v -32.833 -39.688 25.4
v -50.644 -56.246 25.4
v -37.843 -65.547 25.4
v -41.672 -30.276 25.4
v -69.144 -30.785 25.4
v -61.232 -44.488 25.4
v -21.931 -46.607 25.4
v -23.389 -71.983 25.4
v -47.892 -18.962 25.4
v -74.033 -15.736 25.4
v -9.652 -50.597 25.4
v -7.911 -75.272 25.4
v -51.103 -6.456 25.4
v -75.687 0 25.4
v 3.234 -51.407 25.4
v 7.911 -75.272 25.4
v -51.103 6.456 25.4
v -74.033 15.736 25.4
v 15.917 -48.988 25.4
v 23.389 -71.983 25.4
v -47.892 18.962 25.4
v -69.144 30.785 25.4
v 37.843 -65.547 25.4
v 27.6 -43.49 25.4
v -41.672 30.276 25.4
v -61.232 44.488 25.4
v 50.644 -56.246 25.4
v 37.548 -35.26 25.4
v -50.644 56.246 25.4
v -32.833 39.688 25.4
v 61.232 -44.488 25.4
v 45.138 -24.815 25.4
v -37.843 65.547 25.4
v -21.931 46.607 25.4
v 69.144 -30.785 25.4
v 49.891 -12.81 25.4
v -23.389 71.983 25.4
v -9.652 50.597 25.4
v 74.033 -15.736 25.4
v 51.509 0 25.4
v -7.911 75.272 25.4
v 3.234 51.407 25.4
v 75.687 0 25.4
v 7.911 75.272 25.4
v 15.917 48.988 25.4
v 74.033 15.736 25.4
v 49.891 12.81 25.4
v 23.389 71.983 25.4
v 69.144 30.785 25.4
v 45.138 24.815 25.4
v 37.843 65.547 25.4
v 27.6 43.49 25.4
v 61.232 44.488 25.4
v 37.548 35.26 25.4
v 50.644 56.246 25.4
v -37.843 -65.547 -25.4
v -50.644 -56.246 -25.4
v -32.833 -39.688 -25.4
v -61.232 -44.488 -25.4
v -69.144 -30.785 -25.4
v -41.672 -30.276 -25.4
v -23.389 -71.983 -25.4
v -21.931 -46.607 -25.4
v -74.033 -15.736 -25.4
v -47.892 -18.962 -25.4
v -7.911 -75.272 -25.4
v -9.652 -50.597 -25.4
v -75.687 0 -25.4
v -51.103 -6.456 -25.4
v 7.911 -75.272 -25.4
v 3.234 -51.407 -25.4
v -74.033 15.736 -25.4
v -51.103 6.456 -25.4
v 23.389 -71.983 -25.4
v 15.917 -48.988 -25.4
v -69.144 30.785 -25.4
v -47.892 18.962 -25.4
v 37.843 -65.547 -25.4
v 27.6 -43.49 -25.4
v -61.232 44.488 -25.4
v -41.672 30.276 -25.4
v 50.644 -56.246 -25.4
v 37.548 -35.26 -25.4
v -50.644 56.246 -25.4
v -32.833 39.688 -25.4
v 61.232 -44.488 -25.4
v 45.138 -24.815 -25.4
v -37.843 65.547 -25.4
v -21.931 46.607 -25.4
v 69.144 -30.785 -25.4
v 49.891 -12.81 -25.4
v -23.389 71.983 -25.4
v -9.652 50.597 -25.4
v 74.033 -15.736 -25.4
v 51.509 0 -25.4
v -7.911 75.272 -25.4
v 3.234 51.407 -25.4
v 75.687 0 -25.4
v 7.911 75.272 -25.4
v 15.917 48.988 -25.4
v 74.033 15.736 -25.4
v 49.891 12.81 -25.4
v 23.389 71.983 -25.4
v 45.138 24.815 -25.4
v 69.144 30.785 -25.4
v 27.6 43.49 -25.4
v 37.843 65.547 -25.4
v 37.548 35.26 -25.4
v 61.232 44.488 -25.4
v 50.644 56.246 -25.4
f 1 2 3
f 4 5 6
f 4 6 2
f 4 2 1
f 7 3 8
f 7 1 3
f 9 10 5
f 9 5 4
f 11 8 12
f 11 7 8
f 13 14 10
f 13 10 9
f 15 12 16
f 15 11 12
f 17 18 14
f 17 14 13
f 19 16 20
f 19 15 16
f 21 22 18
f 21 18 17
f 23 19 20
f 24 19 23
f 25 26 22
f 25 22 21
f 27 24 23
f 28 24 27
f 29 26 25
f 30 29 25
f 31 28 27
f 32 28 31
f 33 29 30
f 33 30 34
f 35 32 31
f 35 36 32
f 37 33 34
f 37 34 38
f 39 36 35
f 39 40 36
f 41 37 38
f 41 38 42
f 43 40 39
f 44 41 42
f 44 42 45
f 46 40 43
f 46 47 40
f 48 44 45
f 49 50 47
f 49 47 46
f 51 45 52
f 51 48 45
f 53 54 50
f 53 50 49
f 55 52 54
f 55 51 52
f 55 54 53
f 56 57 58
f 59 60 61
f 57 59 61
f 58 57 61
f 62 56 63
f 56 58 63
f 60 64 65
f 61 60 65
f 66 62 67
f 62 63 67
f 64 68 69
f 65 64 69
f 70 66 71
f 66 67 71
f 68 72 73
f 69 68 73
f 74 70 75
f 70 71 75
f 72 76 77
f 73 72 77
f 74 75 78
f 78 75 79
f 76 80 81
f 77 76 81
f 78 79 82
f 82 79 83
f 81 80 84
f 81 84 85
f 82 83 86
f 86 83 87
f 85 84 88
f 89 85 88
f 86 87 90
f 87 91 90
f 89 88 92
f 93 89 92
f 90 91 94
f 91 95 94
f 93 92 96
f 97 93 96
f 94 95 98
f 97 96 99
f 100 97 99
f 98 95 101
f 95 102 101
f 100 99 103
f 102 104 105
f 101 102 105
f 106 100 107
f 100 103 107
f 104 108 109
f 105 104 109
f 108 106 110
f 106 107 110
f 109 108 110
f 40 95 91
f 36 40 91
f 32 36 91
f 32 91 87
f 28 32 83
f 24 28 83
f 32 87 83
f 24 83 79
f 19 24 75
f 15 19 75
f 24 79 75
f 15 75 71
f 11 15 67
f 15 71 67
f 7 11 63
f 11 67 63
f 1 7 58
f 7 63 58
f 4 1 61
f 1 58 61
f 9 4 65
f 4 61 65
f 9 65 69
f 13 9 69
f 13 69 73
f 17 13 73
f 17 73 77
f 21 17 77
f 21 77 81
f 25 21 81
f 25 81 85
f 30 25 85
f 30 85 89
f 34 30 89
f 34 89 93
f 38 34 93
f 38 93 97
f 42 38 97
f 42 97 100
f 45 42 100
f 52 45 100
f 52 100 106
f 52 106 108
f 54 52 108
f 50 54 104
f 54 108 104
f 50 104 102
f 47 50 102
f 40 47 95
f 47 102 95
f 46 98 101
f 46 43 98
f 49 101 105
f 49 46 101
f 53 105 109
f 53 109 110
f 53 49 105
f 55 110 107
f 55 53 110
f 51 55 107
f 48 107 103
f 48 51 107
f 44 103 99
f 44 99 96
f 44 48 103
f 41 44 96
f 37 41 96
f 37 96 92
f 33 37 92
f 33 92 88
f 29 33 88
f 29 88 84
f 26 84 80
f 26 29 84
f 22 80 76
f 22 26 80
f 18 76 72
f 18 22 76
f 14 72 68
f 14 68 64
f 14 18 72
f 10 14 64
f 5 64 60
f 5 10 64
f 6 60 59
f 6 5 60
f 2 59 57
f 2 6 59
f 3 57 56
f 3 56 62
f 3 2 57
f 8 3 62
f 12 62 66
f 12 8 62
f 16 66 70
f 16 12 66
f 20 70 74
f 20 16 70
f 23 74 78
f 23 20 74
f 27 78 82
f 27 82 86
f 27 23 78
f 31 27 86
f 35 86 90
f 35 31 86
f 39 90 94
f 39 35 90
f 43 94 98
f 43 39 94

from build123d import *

# Parameters (mm, degrees)
F0_R     = 75.686993118
F1_DEPTH = 25.4
F2_DEPTH = 25.4
F7_R     = 51.508951791
F8_DEPTH = 50.801


# Not quite as in the source:
# - a feature of the source that left no trace in its solid (it failed there, or was rolled back) is left out
# - the program builds the solid bodies; features that only make, move or delete a surface that nothing else refers to are left out


with BuildPart() as f1:
    # F0 (on Top) → F1 (new body)
    with BuildSketch(Plane.XY):
        Circle(F0_R)
    extrude(amount=F1_DEPTH)

    # F2 (add): a face of the model
    f2_faces = [f1.faces().sort_by_distance(p)[0] for p in [
        (0, 0, 0),
    ]]
    extrude(f2_faces, amount=F2_DEPTH)

    # F7 (on face) → F8 (cut, through all)
    with BuildSketch(Plane(origin=(0, 0, -25.4), x_dir=(1, 0, 0), z_dir=(0, 0, -1))):
        Circle(F7_R)
    extrude(amount=-F8_DEPTH, mode=Mode.SUBTRACT)


solid = f1.part
